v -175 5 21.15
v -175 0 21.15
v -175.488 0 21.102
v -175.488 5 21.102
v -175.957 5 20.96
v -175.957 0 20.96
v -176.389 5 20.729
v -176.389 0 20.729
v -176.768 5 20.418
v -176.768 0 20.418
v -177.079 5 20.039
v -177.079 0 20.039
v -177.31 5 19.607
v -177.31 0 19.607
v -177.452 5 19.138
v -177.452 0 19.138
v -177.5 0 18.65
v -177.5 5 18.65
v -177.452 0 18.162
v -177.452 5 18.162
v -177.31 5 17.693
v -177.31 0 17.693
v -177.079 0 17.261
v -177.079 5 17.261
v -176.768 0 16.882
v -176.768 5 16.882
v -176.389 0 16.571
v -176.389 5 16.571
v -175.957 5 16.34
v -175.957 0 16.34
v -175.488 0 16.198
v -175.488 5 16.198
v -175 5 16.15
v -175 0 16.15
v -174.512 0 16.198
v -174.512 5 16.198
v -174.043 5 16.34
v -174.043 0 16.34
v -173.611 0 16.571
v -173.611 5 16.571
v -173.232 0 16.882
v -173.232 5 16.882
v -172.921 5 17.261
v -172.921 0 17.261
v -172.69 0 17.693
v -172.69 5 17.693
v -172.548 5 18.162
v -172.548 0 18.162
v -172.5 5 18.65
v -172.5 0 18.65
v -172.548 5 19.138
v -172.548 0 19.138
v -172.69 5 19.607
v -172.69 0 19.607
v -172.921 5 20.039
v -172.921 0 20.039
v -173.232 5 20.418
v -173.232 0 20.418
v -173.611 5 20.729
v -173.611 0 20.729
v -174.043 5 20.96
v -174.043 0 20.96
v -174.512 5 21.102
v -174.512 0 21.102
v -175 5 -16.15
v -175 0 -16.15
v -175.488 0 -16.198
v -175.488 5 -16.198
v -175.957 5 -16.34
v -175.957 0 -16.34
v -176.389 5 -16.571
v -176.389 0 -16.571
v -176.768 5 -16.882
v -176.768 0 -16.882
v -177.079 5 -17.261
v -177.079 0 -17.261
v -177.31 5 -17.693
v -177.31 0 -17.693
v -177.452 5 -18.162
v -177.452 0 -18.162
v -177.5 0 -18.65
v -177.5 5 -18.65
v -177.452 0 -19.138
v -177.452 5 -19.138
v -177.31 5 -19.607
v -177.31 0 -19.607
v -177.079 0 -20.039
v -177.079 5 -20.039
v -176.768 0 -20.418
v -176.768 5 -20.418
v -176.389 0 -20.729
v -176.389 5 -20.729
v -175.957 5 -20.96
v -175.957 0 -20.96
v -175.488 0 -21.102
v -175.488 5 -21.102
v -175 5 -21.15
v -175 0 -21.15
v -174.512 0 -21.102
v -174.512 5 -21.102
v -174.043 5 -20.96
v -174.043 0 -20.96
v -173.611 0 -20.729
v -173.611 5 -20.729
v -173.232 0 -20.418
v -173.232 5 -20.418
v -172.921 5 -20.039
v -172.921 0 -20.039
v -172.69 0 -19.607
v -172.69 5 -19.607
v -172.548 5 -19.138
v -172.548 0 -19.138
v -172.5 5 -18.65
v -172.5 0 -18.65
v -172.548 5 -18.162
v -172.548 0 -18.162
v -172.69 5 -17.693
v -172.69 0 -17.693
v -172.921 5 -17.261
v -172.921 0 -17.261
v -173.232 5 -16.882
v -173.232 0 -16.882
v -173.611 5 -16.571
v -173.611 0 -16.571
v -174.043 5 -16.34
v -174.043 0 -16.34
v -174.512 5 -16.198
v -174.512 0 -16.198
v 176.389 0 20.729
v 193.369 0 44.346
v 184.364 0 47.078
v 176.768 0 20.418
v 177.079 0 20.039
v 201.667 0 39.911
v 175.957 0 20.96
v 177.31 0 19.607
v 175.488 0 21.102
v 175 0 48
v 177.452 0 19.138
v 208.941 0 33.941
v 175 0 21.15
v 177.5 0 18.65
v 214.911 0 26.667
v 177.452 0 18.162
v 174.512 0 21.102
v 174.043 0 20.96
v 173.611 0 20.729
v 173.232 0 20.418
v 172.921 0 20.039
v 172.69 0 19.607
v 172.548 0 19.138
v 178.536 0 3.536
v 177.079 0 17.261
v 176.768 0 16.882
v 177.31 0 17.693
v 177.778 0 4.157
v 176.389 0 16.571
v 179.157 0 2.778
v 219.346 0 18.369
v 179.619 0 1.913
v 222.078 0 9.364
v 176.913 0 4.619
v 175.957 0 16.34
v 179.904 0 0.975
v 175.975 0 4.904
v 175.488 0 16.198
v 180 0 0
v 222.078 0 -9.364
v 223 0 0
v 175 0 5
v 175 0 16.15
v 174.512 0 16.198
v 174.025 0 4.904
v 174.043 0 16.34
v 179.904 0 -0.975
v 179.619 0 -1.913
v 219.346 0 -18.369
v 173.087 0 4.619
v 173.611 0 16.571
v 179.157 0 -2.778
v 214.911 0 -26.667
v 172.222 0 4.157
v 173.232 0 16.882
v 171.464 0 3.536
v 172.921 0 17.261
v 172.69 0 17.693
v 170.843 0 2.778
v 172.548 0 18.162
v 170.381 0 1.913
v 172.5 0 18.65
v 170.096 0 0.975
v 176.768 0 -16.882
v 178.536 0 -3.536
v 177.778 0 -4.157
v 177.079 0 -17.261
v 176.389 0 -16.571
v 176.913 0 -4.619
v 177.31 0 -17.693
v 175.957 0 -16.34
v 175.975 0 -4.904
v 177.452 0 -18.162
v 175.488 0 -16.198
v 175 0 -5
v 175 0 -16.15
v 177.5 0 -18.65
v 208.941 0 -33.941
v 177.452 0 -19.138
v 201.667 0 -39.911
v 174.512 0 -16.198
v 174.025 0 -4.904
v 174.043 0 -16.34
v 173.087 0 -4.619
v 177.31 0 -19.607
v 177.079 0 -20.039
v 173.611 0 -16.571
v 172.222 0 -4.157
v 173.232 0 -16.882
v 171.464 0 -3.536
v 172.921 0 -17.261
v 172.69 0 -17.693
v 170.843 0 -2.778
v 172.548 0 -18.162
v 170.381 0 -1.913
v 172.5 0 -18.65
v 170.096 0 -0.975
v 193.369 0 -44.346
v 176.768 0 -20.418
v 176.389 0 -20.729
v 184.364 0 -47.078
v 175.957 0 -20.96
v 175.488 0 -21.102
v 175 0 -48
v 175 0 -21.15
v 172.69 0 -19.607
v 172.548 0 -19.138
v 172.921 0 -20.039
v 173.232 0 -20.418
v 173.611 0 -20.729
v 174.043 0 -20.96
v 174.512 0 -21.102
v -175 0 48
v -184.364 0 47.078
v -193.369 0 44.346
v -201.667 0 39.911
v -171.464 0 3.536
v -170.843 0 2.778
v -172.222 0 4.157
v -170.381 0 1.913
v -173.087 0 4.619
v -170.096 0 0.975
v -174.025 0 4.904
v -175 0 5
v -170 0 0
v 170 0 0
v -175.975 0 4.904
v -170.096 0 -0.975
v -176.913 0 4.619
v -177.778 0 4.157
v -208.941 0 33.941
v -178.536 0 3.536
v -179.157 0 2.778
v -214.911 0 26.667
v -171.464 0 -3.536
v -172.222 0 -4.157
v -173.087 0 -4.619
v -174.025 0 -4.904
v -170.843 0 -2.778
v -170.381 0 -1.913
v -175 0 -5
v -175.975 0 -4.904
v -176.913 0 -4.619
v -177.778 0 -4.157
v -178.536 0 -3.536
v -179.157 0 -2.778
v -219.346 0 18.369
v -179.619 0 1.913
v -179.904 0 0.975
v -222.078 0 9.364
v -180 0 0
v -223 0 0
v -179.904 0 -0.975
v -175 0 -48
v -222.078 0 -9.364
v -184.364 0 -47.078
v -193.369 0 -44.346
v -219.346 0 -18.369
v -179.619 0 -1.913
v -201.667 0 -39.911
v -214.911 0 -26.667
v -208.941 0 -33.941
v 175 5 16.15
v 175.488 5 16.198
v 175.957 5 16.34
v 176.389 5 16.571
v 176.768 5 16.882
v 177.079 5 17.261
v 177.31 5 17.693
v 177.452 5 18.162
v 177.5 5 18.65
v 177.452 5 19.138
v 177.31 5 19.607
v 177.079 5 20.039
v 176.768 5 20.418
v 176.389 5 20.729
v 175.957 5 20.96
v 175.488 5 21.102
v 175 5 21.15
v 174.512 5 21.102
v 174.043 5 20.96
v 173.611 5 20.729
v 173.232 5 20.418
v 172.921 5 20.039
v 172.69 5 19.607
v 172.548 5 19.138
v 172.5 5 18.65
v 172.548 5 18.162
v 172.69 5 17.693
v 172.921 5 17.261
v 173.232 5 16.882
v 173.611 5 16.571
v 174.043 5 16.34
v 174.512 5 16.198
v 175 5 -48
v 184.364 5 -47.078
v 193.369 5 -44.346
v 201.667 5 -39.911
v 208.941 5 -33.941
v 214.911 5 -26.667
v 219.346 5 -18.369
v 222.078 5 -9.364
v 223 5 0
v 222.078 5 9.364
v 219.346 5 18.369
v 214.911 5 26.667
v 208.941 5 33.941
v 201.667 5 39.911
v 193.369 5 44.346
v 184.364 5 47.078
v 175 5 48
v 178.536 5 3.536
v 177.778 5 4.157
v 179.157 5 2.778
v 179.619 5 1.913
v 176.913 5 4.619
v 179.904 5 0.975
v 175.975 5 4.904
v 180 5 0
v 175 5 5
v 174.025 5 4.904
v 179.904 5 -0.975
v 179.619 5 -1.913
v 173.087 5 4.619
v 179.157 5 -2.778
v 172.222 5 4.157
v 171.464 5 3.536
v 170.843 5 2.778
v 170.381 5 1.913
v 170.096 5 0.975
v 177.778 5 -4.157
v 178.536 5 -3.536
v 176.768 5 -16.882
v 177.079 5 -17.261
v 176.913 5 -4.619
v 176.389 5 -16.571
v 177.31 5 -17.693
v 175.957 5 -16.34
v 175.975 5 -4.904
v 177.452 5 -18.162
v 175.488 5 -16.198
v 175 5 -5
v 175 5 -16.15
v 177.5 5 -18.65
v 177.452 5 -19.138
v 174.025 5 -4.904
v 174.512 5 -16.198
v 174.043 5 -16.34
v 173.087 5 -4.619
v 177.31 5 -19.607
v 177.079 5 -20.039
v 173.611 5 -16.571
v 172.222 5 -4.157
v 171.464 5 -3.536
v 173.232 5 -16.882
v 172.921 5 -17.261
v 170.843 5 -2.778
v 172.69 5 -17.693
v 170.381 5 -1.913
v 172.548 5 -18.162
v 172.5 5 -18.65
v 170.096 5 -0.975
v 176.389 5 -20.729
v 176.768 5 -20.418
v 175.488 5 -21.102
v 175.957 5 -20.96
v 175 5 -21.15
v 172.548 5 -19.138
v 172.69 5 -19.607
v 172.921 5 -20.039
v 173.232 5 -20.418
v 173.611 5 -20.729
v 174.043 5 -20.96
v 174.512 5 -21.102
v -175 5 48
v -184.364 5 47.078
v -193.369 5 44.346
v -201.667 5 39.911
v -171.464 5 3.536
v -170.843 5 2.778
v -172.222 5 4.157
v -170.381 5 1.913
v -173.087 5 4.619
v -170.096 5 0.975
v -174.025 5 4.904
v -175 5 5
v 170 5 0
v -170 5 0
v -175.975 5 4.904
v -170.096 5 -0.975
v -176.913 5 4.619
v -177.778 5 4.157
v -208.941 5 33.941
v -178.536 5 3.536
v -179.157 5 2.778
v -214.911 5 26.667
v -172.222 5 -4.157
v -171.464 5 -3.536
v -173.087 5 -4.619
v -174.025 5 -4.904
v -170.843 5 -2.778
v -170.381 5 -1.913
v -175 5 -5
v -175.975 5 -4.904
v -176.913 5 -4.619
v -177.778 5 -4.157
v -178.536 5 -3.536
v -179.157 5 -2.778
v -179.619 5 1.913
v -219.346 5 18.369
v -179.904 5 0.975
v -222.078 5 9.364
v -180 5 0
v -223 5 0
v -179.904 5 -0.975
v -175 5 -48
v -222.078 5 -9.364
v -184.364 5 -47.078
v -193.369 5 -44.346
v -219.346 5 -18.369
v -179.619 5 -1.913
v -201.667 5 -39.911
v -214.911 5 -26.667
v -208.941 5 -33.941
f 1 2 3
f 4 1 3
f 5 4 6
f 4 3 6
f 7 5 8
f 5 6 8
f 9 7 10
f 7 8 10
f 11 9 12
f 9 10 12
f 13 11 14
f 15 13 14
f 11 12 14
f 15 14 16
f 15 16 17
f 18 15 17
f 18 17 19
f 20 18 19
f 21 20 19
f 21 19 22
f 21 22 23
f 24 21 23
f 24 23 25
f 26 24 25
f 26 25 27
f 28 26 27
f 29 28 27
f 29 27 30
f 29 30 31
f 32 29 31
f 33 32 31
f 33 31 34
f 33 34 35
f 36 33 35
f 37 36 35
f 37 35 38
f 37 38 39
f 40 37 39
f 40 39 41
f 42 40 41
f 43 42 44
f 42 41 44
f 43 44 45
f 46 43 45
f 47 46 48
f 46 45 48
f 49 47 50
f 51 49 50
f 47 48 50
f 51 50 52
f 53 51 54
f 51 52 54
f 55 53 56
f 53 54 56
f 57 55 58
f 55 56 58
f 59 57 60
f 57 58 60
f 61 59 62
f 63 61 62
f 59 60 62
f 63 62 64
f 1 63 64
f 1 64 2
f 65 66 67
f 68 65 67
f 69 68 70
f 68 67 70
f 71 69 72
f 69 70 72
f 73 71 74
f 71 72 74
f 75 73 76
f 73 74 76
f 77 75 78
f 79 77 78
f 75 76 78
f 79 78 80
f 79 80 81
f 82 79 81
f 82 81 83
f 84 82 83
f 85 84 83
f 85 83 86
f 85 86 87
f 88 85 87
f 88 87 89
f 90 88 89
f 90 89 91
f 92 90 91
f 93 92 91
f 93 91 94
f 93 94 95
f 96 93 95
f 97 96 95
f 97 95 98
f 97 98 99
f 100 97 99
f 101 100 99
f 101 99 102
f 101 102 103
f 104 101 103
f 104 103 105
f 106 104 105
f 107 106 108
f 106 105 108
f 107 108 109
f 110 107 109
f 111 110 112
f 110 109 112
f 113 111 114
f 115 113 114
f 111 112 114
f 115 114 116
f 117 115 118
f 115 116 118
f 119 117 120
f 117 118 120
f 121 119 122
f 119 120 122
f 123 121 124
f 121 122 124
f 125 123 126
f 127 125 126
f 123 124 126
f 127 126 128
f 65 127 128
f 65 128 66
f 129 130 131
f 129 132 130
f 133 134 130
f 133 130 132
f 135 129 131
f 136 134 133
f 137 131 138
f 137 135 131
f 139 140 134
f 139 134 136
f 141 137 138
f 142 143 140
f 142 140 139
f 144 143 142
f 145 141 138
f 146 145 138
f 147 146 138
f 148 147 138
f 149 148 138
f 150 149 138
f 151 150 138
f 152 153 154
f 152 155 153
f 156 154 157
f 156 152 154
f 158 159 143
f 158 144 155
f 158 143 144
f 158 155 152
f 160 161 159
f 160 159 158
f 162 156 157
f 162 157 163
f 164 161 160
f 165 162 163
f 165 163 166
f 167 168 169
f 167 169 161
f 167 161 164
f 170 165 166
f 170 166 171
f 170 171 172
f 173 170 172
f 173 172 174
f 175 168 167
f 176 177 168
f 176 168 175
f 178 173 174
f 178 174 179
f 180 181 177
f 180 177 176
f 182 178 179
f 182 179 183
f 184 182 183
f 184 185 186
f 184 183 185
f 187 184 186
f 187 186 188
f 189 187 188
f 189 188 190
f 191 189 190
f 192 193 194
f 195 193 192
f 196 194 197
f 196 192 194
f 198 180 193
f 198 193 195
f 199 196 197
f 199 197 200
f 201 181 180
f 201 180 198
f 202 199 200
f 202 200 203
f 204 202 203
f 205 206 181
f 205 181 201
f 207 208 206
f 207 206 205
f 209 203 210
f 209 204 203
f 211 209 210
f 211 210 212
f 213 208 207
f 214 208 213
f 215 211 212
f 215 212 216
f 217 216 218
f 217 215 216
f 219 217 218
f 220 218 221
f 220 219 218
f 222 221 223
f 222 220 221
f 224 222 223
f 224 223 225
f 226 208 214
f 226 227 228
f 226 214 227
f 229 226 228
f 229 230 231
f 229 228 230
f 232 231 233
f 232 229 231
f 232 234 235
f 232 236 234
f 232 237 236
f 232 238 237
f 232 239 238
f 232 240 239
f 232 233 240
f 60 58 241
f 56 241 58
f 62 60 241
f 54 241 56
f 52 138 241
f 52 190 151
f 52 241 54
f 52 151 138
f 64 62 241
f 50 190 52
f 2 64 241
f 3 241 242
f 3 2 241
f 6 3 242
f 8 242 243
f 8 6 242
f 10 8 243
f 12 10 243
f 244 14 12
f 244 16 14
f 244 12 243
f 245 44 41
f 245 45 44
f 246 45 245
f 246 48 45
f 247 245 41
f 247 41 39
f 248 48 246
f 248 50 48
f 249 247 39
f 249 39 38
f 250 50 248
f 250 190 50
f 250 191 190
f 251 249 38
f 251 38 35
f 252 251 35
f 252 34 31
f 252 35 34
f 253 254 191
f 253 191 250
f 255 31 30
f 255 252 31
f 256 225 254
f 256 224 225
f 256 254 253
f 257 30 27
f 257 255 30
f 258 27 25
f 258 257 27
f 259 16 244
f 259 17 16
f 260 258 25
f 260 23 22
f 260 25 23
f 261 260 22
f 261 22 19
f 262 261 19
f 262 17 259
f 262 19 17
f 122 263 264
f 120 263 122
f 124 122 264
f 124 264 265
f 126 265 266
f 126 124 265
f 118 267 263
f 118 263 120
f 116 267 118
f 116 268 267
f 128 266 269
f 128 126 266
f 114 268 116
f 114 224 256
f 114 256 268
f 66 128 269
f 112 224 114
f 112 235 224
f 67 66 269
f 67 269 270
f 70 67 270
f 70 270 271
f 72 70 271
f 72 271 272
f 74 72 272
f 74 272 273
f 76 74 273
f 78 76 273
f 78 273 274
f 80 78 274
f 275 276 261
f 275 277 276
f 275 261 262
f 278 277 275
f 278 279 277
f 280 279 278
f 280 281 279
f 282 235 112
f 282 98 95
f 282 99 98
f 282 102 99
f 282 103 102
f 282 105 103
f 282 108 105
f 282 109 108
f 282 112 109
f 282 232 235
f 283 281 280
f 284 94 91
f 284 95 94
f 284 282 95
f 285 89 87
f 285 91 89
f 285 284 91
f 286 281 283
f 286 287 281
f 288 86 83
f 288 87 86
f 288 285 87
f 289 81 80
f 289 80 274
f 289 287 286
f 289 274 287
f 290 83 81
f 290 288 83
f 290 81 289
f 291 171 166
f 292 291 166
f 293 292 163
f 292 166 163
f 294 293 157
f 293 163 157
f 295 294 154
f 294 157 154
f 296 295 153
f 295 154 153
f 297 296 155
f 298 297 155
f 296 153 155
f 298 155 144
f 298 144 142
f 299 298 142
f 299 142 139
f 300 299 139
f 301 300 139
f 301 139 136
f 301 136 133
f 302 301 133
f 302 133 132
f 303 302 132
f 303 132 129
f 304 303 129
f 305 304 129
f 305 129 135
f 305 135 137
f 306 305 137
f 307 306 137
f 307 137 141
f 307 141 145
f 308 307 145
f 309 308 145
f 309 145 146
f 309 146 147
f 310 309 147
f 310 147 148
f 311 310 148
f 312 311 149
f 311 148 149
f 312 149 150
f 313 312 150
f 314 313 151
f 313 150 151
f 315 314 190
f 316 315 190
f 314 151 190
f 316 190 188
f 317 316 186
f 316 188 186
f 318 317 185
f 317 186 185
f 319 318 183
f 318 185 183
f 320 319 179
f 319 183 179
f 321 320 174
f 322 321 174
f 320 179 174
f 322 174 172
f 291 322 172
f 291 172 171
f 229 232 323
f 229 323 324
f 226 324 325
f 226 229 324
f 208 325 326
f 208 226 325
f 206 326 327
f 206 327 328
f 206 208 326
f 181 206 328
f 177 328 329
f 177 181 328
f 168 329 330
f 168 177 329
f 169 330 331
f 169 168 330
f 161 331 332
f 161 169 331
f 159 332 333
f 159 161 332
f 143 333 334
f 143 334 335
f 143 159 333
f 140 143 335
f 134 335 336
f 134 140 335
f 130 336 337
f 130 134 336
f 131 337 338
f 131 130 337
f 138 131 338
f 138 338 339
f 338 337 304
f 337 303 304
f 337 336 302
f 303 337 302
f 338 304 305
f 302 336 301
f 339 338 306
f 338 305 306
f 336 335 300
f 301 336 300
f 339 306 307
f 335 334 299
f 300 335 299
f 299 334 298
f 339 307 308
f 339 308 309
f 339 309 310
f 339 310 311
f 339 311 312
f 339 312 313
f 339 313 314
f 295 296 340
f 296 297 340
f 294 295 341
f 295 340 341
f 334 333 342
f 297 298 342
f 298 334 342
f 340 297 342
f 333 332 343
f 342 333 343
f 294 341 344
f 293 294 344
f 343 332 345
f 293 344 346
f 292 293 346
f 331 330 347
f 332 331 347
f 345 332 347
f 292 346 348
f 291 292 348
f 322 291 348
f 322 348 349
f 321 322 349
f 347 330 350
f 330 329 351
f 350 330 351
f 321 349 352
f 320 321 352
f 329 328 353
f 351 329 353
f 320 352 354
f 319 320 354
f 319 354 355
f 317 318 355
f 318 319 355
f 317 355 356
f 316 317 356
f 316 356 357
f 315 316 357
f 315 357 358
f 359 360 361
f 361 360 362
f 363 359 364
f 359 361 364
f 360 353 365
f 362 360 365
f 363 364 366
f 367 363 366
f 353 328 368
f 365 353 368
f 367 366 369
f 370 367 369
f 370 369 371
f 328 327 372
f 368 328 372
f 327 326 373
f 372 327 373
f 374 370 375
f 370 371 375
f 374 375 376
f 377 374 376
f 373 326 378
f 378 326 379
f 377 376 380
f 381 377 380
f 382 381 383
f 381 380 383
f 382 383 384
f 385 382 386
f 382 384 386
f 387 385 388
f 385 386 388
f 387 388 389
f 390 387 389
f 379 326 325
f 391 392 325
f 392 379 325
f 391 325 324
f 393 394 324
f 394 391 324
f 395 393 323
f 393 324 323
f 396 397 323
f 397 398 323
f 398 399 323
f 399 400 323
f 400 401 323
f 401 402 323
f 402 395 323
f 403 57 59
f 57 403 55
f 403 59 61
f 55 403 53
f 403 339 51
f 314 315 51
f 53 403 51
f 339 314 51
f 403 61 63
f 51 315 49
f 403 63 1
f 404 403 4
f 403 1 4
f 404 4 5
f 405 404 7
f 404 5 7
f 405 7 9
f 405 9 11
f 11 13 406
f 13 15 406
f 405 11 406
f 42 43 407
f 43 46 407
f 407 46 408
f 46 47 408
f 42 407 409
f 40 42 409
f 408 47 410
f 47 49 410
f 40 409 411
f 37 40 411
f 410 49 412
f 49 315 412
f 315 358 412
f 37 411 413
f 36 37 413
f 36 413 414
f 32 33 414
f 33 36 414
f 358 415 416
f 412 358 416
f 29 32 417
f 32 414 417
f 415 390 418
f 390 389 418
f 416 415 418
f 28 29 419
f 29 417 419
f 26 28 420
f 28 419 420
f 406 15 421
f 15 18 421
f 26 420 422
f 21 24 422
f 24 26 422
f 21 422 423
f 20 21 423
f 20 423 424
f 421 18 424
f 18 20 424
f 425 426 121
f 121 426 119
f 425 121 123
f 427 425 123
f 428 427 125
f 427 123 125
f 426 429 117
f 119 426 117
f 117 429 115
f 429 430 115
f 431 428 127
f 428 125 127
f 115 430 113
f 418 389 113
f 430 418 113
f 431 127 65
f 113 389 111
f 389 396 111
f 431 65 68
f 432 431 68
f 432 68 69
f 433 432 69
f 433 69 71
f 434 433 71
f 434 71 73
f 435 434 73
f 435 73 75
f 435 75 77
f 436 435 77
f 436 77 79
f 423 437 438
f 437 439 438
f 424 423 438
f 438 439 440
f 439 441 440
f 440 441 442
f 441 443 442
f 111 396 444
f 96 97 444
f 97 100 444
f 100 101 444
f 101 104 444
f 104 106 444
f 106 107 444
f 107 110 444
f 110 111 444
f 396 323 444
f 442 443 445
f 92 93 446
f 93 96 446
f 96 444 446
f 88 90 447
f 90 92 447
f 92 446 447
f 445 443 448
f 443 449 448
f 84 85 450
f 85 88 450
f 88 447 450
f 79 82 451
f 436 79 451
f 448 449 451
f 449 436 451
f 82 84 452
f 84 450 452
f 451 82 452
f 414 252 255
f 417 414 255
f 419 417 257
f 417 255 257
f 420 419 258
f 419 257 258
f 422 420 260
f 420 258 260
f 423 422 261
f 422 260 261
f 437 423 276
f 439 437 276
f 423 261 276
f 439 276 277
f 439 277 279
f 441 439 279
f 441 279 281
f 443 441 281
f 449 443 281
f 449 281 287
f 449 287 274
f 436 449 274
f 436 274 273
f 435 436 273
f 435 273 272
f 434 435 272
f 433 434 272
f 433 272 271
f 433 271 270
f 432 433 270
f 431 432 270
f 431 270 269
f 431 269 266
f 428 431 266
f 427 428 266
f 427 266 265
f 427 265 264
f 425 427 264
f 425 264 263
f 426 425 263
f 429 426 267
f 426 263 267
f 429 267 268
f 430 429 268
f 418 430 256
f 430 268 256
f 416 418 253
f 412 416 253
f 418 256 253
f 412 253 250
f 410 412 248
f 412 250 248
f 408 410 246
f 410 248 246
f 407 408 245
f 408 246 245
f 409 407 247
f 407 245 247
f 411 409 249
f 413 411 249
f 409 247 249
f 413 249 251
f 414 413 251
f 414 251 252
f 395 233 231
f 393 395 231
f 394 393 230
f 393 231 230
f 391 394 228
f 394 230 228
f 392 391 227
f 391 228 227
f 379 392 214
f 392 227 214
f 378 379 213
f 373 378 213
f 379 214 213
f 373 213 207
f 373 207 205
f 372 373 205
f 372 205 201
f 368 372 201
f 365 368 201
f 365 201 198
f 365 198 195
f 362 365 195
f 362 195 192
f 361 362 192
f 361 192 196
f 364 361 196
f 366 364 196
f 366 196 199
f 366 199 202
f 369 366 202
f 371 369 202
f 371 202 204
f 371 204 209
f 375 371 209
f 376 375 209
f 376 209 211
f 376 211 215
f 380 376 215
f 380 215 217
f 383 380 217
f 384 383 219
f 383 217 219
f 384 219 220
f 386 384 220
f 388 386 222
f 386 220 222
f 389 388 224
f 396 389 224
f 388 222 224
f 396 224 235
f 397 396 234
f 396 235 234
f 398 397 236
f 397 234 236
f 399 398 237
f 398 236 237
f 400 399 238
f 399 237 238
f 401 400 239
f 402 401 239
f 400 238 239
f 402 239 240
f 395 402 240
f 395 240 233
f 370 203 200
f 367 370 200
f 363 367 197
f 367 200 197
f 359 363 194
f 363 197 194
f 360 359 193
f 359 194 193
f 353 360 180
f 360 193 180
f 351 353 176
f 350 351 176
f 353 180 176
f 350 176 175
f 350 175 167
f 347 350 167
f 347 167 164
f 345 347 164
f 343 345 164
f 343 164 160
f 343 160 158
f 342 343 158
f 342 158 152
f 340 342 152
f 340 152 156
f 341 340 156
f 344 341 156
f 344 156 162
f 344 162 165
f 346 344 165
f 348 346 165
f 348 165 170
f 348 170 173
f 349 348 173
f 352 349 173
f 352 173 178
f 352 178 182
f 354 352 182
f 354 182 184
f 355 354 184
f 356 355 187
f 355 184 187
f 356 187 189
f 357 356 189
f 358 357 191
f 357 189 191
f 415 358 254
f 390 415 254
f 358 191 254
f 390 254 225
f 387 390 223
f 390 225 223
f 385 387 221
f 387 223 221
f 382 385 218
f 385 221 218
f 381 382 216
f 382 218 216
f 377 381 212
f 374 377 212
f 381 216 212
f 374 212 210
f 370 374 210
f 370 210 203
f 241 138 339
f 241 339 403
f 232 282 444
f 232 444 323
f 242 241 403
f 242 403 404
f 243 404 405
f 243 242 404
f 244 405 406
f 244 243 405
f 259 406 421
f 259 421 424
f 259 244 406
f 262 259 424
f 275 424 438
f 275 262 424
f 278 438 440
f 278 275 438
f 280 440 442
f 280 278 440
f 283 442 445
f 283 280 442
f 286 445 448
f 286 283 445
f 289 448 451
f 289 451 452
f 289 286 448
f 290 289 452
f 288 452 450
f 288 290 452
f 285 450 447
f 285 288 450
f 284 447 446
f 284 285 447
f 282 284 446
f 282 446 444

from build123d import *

# Parameters (mm, degrees)
BOSS_EXTRUDE1_DEPTH = 5
SKETCH2_R           = 5
SKETCH2_R_2         = 2.5
CUT_EXTRUDE1_DEPTH  = 10


with BuildPart() as part:
    # Sketch1 → Boss-Extrude1 (new body)
    with BuildSketch(Plane(origin=(0, 0, 0), x_dir=(1, 0, 0), z_dir=(0, 1, 0))):
        with BuildLine():
            Line((-175, 48), (175, 48))
            ThreePointArc((175, 48), (223, 0), (175, -48))
            Line((175, -48), (-175, -48))
            ThreePointArc((-175, -48), (-223, 0), (-175, 48))
        make_face()
    extrude(amount=BOSS_EXTRUDE1_DEPTH)

    # Sketch2 → Cut-Extrude1 (cut)
    with BuildSketch(Plane.XZ):
        with Locations(Location((175, 0, 0), (0, 0, 270))):
            Circle(SKETCH2_R)
        with Locations(Location((175, 18.65, 0), (0, 0, 270))):
            Circle(SKETCH2_R_2)
        with Locations(Location((175, -18.65, 0), (0, 0, 270))):
            Circle(SKETCH2_R_2)
        with Locations(Location((-175, -18.65, 0), (0, 0, 90))):
            Circle(SKETCH2_R_2)
        with Locations(Location((-175, 18.65, 0), (0, 0, 90))):
            Circle(SKETCH2_R_2)
        with Locations(Location((-175, 0, 0), (0, 0, 90))):
            Circle(SKETCH2_R)
    extrude(amount=-CUT_EXTRUDE1_DEPTH, mode=Mode.SUBTRACT)


solid = part.part
